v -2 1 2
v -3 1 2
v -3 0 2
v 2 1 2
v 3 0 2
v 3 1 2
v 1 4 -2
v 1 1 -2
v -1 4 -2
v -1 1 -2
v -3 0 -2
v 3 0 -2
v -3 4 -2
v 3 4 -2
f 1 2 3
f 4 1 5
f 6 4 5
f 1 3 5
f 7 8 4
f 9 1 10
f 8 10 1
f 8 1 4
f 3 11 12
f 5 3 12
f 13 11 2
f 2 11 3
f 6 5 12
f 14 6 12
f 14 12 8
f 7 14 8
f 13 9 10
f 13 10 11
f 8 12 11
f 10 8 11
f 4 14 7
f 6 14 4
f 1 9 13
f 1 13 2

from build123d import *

# Parameters (mm, degrees)
SKETCH_1_W          = 6
SKETCH_1_H          = 4
EXTRUDE_1_DEPTH     = 1
EXTRUDE_2_DEPTH     = 4
CUT_EXTRUDE_1_DEPTH = 9


with BuildPart() as part:
    # 草圖1 → 填料-伸長1 (new body)
    with BuildSketch(Plane(origin=(0, 0, 0), x_dir=(1, 0, 0), z_dir=(0, 1, 0))):
        Rectangle(SKETCH_1_W, SKETCH_1_H)
    extrude(amount=EXTRUDE_1_DEPTH)

    # 草圖1<3> → 填料-伸長2 (add)
    with BuildSketch(Plane(origin=(0, 0, 0), x_dir=(1, 0, 0), z_dir=(0, 1, 0))):
        Polygon((-2, -2), (-1, 2), (-3, 2), (-3, -2), align=None)
        Polygon((3, 2), (1, 2), (2, -2), (3, -2), align=None)
    extrude(amount=EXTRUDE_2_DEPTH)

    # 草圖2 → 除料-伸長1 (cut)
    with BuildSketch(Plane(origin=(3, 0, 0), x_dir=(0, 0, -1), z_dir=(1, 0, 0))):
        Polygon((2, 4), (-2, 1), (-2, 4), align=None)
    extrude(amount=-CUT_EXTRUDE_1_DEPTH, mode=Mode.SUBTRACT)


solid = part.part
